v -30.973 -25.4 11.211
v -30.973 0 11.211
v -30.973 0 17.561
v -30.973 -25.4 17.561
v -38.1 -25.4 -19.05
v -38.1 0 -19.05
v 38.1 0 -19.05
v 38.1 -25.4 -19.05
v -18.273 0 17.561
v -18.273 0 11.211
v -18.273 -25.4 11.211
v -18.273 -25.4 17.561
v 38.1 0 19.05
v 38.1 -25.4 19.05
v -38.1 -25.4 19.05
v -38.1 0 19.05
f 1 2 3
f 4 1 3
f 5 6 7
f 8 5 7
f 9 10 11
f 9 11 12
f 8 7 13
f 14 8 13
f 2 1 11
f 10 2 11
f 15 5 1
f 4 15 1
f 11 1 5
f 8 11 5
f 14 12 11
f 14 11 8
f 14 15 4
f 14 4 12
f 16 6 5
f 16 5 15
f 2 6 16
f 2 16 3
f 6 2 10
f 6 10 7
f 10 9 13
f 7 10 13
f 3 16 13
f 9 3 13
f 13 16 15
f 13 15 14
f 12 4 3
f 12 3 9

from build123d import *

# Parameters (mm, degrees)
F0_W     = 76.2
F0_H     = 38.1
F1_DEPTH = 25.4
F2_W     = 12.7
F2_H     = 6.35
F3_DEPTH = 36.83
F4_W     = 12.7
F4_H     = 6.35
F5_DEPTH = 101.854


with BuildPart() as f1:
    # F0 (on Front) → F1 (new body)
    with BuildSketch(Plane.XZ):
        Rectangle(F0_W, F0_H)
    extrude(amount=F1_DEPTH)

    # F2 (on Front) → F3 (cut)
    with BuildSketch(Plane.XZ):
        with Locations((-28.330677, 12.612414)):
            Rectangle(F2_W, F2_H)
    extrude(amount=-F3_DEPTH, mode=Mode.SUBTRACT)

    # F4 (on Front) → F5 (cut)
    with BuildSketch(Plane.XZ):
        with Locations((-24.622671, 14.386035)):
            Rectangle(F4_W, F4_H)
    extrude(amount=F5_DEPTH, mode=Mode.SUBTRACT)


solid = f1.part
